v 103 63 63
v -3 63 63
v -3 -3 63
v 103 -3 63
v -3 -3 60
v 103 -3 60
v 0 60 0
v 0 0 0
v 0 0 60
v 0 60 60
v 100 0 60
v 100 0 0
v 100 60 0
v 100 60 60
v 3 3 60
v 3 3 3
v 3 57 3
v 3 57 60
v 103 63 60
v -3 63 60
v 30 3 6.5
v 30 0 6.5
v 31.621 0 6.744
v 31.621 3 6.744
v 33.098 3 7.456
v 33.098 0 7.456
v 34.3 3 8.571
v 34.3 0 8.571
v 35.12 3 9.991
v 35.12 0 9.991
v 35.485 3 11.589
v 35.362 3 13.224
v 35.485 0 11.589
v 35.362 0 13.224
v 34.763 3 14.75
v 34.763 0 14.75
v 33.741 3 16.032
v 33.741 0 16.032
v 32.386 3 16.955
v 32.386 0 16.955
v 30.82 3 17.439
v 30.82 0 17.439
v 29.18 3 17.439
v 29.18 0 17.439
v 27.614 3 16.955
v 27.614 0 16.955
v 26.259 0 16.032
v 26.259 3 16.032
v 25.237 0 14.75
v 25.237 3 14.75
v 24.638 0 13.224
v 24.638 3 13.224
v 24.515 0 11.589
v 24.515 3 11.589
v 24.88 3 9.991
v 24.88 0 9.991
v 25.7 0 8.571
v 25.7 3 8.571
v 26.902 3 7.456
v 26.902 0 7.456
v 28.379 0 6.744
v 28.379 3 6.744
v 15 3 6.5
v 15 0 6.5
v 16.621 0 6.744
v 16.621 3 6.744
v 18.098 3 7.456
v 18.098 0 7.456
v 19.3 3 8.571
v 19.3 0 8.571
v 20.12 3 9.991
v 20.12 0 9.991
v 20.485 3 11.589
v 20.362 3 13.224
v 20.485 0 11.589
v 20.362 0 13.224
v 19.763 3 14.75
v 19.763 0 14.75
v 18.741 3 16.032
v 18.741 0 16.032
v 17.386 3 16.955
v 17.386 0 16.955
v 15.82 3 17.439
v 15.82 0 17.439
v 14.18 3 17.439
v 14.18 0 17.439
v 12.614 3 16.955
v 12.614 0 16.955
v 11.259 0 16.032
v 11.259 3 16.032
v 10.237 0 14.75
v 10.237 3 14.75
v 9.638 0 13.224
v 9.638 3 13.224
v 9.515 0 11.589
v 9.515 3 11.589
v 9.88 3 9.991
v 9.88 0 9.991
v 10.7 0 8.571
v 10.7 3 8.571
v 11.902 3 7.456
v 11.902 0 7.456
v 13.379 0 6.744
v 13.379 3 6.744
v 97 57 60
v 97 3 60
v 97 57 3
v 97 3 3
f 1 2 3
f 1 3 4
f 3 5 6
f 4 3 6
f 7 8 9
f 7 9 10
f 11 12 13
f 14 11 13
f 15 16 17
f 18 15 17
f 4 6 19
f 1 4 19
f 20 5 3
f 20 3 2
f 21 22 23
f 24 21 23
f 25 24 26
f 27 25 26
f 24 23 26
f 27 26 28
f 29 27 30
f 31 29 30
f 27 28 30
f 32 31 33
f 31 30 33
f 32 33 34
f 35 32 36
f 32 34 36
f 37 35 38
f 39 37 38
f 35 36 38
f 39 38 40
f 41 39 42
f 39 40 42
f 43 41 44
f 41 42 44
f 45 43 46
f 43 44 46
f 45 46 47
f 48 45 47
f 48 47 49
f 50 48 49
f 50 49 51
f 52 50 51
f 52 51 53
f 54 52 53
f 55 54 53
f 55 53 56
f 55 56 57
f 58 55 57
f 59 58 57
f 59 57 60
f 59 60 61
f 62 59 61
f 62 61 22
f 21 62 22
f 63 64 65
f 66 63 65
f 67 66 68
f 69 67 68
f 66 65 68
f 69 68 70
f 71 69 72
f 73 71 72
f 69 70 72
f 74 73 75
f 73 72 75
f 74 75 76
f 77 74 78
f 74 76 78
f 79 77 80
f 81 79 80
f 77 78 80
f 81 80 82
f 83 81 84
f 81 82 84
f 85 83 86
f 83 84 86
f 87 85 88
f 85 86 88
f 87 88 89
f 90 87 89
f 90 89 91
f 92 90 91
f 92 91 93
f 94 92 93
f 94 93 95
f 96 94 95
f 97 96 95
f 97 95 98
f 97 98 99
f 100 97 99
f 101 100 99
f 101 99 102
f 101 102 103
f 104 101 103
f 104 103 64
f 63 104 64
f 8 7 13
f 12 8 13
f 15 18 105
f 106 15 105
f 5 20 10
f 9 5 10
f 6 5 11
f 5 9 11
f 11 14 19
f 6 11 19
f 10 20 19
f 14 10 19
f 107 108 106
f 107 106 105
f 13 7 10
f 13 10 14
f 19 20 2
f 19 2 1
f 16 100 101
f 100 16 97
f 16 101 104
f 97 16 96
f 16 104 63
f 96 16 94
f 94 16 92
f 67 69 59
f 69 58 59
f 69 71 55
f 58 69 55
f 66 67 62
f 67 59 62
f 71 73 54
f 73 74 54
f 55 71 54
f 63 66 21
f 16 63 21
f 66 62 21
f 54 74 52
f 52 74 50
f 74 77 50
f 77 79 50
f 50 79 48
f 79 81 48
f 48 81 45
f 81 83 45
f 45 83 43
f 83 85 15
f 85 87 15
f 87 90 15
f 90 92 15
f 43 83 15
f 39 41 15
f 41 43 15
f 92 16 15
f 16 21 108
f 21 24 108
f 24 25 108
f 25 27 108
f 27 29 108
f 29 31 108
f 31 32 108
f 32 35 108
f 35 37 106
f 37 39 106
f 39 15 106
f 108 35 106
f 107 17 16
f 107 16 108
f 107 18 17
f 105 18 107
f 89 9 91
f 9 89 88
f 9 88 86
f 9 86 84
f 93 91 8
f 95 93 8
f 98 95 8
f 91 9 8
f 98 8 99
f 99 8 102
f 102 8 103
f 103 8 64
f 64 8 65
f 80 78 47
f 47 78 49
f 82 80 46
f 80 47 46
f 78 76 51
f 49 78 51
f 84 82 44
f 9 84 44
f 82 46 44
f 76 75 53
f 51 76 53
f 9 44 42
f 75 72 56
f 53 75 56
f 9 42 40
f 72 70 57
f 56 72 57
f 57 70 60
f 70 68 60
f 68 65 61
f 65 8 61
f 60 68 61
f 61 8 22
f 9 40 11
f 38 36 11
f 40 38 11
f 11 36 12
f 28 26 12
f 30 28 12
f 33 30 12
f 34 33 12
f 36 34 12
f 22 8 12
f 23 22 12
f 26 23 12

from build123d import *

# Parameters (mm, degrees)
SKETCH_1_W          = 100
SKETCH_1_H          = 60
EXTRUDE_1_DEPTH     = 60
SKETCH_2_W          = 94
SKETCH_2_H          = 54
CUT_EXTRUDE_1_DEPTH = 57
CUT_EXTRUDE_2_REACH = 133.149
SKETCH_8_R          = 5.5
SKETCH_9_W          = 106
SKETCH_9_H          = 66
EXTRUDE_2_DEPTH     = 3


with BuildPart() as part:
    # 草图1 → 凸台-拉伸1 (new body)
    with BuildSketch(Plane.XY):
        with Locations((50, 30)):
            Rectangle(SKETCH_1_W, SKETCH_1_H)
    extrude(amount=EXTRUDE_1_DEPTH)

    # 草图2 → 切除-拉伸1 (cut)
    with BuildSketch(Plane.XY.offset(60)):
        with Locations((50, 30)):
            Rectangle(SKETCH_2_W, SKETCH_2_H)
    extrude(amount=-CUT_EXTRUDE_1_DEPTH, mode=Mode.SUBTRACT)

    # 草图8 → 切除-拉伸2 (cut, up to next)
    with BuildSketch(Plane.XZ, mode=Mode.PRIVATE) as cut_extrude_2_sk1:
        with Locations(Location((15, 12, 0), (0, 0, 270))):
            Circle(SKETCH_8_R)
    cut_extrude_2_tool1 = extrude(cut_extrude_2_sk1.sketch, amount=-CUT_EXTRUDE_2_REACH, mode=Mode.PRIVATE) & part.part
    # 草图8 → 切除-拉伸2 (cut, up to next)
    with BuildSketch(Plane.XZ, mode=Mode.PRIVATE) as cut_extrude_2_sk2:
        with Locations(Location((30, 12, 0), (0, 0, 270))):
            Circle(SKETCH_8_R)
    cut_extrude_2_tool2 = extrude(cut_extrude_2_sk2.sketch, amount=-CUT_EXTRUDE_2_REACH, mode=Mode.PRIVATE) & part.part
    add(cut_extrude_2_tool1.solids().sort_by_distance((15, 0, 12))[0], mode=Mode.SUBTRACT)
    add(cut_extrude_2_tool2.solids().sort_by_distance((30, 0, 12))[0], mode=Mode.SUBTRACT)

    # 草图9 → 凸台-拉伸2 (add)
    with BuildSketch(Plane.XY.offset(60)):
        with Locations((50, 30)):
            Rectangle(SKETCH_9_W, SKETCH_9_H)
    extrude(amount=EXTRUDE_2_DEPTH)


solid = part.part
